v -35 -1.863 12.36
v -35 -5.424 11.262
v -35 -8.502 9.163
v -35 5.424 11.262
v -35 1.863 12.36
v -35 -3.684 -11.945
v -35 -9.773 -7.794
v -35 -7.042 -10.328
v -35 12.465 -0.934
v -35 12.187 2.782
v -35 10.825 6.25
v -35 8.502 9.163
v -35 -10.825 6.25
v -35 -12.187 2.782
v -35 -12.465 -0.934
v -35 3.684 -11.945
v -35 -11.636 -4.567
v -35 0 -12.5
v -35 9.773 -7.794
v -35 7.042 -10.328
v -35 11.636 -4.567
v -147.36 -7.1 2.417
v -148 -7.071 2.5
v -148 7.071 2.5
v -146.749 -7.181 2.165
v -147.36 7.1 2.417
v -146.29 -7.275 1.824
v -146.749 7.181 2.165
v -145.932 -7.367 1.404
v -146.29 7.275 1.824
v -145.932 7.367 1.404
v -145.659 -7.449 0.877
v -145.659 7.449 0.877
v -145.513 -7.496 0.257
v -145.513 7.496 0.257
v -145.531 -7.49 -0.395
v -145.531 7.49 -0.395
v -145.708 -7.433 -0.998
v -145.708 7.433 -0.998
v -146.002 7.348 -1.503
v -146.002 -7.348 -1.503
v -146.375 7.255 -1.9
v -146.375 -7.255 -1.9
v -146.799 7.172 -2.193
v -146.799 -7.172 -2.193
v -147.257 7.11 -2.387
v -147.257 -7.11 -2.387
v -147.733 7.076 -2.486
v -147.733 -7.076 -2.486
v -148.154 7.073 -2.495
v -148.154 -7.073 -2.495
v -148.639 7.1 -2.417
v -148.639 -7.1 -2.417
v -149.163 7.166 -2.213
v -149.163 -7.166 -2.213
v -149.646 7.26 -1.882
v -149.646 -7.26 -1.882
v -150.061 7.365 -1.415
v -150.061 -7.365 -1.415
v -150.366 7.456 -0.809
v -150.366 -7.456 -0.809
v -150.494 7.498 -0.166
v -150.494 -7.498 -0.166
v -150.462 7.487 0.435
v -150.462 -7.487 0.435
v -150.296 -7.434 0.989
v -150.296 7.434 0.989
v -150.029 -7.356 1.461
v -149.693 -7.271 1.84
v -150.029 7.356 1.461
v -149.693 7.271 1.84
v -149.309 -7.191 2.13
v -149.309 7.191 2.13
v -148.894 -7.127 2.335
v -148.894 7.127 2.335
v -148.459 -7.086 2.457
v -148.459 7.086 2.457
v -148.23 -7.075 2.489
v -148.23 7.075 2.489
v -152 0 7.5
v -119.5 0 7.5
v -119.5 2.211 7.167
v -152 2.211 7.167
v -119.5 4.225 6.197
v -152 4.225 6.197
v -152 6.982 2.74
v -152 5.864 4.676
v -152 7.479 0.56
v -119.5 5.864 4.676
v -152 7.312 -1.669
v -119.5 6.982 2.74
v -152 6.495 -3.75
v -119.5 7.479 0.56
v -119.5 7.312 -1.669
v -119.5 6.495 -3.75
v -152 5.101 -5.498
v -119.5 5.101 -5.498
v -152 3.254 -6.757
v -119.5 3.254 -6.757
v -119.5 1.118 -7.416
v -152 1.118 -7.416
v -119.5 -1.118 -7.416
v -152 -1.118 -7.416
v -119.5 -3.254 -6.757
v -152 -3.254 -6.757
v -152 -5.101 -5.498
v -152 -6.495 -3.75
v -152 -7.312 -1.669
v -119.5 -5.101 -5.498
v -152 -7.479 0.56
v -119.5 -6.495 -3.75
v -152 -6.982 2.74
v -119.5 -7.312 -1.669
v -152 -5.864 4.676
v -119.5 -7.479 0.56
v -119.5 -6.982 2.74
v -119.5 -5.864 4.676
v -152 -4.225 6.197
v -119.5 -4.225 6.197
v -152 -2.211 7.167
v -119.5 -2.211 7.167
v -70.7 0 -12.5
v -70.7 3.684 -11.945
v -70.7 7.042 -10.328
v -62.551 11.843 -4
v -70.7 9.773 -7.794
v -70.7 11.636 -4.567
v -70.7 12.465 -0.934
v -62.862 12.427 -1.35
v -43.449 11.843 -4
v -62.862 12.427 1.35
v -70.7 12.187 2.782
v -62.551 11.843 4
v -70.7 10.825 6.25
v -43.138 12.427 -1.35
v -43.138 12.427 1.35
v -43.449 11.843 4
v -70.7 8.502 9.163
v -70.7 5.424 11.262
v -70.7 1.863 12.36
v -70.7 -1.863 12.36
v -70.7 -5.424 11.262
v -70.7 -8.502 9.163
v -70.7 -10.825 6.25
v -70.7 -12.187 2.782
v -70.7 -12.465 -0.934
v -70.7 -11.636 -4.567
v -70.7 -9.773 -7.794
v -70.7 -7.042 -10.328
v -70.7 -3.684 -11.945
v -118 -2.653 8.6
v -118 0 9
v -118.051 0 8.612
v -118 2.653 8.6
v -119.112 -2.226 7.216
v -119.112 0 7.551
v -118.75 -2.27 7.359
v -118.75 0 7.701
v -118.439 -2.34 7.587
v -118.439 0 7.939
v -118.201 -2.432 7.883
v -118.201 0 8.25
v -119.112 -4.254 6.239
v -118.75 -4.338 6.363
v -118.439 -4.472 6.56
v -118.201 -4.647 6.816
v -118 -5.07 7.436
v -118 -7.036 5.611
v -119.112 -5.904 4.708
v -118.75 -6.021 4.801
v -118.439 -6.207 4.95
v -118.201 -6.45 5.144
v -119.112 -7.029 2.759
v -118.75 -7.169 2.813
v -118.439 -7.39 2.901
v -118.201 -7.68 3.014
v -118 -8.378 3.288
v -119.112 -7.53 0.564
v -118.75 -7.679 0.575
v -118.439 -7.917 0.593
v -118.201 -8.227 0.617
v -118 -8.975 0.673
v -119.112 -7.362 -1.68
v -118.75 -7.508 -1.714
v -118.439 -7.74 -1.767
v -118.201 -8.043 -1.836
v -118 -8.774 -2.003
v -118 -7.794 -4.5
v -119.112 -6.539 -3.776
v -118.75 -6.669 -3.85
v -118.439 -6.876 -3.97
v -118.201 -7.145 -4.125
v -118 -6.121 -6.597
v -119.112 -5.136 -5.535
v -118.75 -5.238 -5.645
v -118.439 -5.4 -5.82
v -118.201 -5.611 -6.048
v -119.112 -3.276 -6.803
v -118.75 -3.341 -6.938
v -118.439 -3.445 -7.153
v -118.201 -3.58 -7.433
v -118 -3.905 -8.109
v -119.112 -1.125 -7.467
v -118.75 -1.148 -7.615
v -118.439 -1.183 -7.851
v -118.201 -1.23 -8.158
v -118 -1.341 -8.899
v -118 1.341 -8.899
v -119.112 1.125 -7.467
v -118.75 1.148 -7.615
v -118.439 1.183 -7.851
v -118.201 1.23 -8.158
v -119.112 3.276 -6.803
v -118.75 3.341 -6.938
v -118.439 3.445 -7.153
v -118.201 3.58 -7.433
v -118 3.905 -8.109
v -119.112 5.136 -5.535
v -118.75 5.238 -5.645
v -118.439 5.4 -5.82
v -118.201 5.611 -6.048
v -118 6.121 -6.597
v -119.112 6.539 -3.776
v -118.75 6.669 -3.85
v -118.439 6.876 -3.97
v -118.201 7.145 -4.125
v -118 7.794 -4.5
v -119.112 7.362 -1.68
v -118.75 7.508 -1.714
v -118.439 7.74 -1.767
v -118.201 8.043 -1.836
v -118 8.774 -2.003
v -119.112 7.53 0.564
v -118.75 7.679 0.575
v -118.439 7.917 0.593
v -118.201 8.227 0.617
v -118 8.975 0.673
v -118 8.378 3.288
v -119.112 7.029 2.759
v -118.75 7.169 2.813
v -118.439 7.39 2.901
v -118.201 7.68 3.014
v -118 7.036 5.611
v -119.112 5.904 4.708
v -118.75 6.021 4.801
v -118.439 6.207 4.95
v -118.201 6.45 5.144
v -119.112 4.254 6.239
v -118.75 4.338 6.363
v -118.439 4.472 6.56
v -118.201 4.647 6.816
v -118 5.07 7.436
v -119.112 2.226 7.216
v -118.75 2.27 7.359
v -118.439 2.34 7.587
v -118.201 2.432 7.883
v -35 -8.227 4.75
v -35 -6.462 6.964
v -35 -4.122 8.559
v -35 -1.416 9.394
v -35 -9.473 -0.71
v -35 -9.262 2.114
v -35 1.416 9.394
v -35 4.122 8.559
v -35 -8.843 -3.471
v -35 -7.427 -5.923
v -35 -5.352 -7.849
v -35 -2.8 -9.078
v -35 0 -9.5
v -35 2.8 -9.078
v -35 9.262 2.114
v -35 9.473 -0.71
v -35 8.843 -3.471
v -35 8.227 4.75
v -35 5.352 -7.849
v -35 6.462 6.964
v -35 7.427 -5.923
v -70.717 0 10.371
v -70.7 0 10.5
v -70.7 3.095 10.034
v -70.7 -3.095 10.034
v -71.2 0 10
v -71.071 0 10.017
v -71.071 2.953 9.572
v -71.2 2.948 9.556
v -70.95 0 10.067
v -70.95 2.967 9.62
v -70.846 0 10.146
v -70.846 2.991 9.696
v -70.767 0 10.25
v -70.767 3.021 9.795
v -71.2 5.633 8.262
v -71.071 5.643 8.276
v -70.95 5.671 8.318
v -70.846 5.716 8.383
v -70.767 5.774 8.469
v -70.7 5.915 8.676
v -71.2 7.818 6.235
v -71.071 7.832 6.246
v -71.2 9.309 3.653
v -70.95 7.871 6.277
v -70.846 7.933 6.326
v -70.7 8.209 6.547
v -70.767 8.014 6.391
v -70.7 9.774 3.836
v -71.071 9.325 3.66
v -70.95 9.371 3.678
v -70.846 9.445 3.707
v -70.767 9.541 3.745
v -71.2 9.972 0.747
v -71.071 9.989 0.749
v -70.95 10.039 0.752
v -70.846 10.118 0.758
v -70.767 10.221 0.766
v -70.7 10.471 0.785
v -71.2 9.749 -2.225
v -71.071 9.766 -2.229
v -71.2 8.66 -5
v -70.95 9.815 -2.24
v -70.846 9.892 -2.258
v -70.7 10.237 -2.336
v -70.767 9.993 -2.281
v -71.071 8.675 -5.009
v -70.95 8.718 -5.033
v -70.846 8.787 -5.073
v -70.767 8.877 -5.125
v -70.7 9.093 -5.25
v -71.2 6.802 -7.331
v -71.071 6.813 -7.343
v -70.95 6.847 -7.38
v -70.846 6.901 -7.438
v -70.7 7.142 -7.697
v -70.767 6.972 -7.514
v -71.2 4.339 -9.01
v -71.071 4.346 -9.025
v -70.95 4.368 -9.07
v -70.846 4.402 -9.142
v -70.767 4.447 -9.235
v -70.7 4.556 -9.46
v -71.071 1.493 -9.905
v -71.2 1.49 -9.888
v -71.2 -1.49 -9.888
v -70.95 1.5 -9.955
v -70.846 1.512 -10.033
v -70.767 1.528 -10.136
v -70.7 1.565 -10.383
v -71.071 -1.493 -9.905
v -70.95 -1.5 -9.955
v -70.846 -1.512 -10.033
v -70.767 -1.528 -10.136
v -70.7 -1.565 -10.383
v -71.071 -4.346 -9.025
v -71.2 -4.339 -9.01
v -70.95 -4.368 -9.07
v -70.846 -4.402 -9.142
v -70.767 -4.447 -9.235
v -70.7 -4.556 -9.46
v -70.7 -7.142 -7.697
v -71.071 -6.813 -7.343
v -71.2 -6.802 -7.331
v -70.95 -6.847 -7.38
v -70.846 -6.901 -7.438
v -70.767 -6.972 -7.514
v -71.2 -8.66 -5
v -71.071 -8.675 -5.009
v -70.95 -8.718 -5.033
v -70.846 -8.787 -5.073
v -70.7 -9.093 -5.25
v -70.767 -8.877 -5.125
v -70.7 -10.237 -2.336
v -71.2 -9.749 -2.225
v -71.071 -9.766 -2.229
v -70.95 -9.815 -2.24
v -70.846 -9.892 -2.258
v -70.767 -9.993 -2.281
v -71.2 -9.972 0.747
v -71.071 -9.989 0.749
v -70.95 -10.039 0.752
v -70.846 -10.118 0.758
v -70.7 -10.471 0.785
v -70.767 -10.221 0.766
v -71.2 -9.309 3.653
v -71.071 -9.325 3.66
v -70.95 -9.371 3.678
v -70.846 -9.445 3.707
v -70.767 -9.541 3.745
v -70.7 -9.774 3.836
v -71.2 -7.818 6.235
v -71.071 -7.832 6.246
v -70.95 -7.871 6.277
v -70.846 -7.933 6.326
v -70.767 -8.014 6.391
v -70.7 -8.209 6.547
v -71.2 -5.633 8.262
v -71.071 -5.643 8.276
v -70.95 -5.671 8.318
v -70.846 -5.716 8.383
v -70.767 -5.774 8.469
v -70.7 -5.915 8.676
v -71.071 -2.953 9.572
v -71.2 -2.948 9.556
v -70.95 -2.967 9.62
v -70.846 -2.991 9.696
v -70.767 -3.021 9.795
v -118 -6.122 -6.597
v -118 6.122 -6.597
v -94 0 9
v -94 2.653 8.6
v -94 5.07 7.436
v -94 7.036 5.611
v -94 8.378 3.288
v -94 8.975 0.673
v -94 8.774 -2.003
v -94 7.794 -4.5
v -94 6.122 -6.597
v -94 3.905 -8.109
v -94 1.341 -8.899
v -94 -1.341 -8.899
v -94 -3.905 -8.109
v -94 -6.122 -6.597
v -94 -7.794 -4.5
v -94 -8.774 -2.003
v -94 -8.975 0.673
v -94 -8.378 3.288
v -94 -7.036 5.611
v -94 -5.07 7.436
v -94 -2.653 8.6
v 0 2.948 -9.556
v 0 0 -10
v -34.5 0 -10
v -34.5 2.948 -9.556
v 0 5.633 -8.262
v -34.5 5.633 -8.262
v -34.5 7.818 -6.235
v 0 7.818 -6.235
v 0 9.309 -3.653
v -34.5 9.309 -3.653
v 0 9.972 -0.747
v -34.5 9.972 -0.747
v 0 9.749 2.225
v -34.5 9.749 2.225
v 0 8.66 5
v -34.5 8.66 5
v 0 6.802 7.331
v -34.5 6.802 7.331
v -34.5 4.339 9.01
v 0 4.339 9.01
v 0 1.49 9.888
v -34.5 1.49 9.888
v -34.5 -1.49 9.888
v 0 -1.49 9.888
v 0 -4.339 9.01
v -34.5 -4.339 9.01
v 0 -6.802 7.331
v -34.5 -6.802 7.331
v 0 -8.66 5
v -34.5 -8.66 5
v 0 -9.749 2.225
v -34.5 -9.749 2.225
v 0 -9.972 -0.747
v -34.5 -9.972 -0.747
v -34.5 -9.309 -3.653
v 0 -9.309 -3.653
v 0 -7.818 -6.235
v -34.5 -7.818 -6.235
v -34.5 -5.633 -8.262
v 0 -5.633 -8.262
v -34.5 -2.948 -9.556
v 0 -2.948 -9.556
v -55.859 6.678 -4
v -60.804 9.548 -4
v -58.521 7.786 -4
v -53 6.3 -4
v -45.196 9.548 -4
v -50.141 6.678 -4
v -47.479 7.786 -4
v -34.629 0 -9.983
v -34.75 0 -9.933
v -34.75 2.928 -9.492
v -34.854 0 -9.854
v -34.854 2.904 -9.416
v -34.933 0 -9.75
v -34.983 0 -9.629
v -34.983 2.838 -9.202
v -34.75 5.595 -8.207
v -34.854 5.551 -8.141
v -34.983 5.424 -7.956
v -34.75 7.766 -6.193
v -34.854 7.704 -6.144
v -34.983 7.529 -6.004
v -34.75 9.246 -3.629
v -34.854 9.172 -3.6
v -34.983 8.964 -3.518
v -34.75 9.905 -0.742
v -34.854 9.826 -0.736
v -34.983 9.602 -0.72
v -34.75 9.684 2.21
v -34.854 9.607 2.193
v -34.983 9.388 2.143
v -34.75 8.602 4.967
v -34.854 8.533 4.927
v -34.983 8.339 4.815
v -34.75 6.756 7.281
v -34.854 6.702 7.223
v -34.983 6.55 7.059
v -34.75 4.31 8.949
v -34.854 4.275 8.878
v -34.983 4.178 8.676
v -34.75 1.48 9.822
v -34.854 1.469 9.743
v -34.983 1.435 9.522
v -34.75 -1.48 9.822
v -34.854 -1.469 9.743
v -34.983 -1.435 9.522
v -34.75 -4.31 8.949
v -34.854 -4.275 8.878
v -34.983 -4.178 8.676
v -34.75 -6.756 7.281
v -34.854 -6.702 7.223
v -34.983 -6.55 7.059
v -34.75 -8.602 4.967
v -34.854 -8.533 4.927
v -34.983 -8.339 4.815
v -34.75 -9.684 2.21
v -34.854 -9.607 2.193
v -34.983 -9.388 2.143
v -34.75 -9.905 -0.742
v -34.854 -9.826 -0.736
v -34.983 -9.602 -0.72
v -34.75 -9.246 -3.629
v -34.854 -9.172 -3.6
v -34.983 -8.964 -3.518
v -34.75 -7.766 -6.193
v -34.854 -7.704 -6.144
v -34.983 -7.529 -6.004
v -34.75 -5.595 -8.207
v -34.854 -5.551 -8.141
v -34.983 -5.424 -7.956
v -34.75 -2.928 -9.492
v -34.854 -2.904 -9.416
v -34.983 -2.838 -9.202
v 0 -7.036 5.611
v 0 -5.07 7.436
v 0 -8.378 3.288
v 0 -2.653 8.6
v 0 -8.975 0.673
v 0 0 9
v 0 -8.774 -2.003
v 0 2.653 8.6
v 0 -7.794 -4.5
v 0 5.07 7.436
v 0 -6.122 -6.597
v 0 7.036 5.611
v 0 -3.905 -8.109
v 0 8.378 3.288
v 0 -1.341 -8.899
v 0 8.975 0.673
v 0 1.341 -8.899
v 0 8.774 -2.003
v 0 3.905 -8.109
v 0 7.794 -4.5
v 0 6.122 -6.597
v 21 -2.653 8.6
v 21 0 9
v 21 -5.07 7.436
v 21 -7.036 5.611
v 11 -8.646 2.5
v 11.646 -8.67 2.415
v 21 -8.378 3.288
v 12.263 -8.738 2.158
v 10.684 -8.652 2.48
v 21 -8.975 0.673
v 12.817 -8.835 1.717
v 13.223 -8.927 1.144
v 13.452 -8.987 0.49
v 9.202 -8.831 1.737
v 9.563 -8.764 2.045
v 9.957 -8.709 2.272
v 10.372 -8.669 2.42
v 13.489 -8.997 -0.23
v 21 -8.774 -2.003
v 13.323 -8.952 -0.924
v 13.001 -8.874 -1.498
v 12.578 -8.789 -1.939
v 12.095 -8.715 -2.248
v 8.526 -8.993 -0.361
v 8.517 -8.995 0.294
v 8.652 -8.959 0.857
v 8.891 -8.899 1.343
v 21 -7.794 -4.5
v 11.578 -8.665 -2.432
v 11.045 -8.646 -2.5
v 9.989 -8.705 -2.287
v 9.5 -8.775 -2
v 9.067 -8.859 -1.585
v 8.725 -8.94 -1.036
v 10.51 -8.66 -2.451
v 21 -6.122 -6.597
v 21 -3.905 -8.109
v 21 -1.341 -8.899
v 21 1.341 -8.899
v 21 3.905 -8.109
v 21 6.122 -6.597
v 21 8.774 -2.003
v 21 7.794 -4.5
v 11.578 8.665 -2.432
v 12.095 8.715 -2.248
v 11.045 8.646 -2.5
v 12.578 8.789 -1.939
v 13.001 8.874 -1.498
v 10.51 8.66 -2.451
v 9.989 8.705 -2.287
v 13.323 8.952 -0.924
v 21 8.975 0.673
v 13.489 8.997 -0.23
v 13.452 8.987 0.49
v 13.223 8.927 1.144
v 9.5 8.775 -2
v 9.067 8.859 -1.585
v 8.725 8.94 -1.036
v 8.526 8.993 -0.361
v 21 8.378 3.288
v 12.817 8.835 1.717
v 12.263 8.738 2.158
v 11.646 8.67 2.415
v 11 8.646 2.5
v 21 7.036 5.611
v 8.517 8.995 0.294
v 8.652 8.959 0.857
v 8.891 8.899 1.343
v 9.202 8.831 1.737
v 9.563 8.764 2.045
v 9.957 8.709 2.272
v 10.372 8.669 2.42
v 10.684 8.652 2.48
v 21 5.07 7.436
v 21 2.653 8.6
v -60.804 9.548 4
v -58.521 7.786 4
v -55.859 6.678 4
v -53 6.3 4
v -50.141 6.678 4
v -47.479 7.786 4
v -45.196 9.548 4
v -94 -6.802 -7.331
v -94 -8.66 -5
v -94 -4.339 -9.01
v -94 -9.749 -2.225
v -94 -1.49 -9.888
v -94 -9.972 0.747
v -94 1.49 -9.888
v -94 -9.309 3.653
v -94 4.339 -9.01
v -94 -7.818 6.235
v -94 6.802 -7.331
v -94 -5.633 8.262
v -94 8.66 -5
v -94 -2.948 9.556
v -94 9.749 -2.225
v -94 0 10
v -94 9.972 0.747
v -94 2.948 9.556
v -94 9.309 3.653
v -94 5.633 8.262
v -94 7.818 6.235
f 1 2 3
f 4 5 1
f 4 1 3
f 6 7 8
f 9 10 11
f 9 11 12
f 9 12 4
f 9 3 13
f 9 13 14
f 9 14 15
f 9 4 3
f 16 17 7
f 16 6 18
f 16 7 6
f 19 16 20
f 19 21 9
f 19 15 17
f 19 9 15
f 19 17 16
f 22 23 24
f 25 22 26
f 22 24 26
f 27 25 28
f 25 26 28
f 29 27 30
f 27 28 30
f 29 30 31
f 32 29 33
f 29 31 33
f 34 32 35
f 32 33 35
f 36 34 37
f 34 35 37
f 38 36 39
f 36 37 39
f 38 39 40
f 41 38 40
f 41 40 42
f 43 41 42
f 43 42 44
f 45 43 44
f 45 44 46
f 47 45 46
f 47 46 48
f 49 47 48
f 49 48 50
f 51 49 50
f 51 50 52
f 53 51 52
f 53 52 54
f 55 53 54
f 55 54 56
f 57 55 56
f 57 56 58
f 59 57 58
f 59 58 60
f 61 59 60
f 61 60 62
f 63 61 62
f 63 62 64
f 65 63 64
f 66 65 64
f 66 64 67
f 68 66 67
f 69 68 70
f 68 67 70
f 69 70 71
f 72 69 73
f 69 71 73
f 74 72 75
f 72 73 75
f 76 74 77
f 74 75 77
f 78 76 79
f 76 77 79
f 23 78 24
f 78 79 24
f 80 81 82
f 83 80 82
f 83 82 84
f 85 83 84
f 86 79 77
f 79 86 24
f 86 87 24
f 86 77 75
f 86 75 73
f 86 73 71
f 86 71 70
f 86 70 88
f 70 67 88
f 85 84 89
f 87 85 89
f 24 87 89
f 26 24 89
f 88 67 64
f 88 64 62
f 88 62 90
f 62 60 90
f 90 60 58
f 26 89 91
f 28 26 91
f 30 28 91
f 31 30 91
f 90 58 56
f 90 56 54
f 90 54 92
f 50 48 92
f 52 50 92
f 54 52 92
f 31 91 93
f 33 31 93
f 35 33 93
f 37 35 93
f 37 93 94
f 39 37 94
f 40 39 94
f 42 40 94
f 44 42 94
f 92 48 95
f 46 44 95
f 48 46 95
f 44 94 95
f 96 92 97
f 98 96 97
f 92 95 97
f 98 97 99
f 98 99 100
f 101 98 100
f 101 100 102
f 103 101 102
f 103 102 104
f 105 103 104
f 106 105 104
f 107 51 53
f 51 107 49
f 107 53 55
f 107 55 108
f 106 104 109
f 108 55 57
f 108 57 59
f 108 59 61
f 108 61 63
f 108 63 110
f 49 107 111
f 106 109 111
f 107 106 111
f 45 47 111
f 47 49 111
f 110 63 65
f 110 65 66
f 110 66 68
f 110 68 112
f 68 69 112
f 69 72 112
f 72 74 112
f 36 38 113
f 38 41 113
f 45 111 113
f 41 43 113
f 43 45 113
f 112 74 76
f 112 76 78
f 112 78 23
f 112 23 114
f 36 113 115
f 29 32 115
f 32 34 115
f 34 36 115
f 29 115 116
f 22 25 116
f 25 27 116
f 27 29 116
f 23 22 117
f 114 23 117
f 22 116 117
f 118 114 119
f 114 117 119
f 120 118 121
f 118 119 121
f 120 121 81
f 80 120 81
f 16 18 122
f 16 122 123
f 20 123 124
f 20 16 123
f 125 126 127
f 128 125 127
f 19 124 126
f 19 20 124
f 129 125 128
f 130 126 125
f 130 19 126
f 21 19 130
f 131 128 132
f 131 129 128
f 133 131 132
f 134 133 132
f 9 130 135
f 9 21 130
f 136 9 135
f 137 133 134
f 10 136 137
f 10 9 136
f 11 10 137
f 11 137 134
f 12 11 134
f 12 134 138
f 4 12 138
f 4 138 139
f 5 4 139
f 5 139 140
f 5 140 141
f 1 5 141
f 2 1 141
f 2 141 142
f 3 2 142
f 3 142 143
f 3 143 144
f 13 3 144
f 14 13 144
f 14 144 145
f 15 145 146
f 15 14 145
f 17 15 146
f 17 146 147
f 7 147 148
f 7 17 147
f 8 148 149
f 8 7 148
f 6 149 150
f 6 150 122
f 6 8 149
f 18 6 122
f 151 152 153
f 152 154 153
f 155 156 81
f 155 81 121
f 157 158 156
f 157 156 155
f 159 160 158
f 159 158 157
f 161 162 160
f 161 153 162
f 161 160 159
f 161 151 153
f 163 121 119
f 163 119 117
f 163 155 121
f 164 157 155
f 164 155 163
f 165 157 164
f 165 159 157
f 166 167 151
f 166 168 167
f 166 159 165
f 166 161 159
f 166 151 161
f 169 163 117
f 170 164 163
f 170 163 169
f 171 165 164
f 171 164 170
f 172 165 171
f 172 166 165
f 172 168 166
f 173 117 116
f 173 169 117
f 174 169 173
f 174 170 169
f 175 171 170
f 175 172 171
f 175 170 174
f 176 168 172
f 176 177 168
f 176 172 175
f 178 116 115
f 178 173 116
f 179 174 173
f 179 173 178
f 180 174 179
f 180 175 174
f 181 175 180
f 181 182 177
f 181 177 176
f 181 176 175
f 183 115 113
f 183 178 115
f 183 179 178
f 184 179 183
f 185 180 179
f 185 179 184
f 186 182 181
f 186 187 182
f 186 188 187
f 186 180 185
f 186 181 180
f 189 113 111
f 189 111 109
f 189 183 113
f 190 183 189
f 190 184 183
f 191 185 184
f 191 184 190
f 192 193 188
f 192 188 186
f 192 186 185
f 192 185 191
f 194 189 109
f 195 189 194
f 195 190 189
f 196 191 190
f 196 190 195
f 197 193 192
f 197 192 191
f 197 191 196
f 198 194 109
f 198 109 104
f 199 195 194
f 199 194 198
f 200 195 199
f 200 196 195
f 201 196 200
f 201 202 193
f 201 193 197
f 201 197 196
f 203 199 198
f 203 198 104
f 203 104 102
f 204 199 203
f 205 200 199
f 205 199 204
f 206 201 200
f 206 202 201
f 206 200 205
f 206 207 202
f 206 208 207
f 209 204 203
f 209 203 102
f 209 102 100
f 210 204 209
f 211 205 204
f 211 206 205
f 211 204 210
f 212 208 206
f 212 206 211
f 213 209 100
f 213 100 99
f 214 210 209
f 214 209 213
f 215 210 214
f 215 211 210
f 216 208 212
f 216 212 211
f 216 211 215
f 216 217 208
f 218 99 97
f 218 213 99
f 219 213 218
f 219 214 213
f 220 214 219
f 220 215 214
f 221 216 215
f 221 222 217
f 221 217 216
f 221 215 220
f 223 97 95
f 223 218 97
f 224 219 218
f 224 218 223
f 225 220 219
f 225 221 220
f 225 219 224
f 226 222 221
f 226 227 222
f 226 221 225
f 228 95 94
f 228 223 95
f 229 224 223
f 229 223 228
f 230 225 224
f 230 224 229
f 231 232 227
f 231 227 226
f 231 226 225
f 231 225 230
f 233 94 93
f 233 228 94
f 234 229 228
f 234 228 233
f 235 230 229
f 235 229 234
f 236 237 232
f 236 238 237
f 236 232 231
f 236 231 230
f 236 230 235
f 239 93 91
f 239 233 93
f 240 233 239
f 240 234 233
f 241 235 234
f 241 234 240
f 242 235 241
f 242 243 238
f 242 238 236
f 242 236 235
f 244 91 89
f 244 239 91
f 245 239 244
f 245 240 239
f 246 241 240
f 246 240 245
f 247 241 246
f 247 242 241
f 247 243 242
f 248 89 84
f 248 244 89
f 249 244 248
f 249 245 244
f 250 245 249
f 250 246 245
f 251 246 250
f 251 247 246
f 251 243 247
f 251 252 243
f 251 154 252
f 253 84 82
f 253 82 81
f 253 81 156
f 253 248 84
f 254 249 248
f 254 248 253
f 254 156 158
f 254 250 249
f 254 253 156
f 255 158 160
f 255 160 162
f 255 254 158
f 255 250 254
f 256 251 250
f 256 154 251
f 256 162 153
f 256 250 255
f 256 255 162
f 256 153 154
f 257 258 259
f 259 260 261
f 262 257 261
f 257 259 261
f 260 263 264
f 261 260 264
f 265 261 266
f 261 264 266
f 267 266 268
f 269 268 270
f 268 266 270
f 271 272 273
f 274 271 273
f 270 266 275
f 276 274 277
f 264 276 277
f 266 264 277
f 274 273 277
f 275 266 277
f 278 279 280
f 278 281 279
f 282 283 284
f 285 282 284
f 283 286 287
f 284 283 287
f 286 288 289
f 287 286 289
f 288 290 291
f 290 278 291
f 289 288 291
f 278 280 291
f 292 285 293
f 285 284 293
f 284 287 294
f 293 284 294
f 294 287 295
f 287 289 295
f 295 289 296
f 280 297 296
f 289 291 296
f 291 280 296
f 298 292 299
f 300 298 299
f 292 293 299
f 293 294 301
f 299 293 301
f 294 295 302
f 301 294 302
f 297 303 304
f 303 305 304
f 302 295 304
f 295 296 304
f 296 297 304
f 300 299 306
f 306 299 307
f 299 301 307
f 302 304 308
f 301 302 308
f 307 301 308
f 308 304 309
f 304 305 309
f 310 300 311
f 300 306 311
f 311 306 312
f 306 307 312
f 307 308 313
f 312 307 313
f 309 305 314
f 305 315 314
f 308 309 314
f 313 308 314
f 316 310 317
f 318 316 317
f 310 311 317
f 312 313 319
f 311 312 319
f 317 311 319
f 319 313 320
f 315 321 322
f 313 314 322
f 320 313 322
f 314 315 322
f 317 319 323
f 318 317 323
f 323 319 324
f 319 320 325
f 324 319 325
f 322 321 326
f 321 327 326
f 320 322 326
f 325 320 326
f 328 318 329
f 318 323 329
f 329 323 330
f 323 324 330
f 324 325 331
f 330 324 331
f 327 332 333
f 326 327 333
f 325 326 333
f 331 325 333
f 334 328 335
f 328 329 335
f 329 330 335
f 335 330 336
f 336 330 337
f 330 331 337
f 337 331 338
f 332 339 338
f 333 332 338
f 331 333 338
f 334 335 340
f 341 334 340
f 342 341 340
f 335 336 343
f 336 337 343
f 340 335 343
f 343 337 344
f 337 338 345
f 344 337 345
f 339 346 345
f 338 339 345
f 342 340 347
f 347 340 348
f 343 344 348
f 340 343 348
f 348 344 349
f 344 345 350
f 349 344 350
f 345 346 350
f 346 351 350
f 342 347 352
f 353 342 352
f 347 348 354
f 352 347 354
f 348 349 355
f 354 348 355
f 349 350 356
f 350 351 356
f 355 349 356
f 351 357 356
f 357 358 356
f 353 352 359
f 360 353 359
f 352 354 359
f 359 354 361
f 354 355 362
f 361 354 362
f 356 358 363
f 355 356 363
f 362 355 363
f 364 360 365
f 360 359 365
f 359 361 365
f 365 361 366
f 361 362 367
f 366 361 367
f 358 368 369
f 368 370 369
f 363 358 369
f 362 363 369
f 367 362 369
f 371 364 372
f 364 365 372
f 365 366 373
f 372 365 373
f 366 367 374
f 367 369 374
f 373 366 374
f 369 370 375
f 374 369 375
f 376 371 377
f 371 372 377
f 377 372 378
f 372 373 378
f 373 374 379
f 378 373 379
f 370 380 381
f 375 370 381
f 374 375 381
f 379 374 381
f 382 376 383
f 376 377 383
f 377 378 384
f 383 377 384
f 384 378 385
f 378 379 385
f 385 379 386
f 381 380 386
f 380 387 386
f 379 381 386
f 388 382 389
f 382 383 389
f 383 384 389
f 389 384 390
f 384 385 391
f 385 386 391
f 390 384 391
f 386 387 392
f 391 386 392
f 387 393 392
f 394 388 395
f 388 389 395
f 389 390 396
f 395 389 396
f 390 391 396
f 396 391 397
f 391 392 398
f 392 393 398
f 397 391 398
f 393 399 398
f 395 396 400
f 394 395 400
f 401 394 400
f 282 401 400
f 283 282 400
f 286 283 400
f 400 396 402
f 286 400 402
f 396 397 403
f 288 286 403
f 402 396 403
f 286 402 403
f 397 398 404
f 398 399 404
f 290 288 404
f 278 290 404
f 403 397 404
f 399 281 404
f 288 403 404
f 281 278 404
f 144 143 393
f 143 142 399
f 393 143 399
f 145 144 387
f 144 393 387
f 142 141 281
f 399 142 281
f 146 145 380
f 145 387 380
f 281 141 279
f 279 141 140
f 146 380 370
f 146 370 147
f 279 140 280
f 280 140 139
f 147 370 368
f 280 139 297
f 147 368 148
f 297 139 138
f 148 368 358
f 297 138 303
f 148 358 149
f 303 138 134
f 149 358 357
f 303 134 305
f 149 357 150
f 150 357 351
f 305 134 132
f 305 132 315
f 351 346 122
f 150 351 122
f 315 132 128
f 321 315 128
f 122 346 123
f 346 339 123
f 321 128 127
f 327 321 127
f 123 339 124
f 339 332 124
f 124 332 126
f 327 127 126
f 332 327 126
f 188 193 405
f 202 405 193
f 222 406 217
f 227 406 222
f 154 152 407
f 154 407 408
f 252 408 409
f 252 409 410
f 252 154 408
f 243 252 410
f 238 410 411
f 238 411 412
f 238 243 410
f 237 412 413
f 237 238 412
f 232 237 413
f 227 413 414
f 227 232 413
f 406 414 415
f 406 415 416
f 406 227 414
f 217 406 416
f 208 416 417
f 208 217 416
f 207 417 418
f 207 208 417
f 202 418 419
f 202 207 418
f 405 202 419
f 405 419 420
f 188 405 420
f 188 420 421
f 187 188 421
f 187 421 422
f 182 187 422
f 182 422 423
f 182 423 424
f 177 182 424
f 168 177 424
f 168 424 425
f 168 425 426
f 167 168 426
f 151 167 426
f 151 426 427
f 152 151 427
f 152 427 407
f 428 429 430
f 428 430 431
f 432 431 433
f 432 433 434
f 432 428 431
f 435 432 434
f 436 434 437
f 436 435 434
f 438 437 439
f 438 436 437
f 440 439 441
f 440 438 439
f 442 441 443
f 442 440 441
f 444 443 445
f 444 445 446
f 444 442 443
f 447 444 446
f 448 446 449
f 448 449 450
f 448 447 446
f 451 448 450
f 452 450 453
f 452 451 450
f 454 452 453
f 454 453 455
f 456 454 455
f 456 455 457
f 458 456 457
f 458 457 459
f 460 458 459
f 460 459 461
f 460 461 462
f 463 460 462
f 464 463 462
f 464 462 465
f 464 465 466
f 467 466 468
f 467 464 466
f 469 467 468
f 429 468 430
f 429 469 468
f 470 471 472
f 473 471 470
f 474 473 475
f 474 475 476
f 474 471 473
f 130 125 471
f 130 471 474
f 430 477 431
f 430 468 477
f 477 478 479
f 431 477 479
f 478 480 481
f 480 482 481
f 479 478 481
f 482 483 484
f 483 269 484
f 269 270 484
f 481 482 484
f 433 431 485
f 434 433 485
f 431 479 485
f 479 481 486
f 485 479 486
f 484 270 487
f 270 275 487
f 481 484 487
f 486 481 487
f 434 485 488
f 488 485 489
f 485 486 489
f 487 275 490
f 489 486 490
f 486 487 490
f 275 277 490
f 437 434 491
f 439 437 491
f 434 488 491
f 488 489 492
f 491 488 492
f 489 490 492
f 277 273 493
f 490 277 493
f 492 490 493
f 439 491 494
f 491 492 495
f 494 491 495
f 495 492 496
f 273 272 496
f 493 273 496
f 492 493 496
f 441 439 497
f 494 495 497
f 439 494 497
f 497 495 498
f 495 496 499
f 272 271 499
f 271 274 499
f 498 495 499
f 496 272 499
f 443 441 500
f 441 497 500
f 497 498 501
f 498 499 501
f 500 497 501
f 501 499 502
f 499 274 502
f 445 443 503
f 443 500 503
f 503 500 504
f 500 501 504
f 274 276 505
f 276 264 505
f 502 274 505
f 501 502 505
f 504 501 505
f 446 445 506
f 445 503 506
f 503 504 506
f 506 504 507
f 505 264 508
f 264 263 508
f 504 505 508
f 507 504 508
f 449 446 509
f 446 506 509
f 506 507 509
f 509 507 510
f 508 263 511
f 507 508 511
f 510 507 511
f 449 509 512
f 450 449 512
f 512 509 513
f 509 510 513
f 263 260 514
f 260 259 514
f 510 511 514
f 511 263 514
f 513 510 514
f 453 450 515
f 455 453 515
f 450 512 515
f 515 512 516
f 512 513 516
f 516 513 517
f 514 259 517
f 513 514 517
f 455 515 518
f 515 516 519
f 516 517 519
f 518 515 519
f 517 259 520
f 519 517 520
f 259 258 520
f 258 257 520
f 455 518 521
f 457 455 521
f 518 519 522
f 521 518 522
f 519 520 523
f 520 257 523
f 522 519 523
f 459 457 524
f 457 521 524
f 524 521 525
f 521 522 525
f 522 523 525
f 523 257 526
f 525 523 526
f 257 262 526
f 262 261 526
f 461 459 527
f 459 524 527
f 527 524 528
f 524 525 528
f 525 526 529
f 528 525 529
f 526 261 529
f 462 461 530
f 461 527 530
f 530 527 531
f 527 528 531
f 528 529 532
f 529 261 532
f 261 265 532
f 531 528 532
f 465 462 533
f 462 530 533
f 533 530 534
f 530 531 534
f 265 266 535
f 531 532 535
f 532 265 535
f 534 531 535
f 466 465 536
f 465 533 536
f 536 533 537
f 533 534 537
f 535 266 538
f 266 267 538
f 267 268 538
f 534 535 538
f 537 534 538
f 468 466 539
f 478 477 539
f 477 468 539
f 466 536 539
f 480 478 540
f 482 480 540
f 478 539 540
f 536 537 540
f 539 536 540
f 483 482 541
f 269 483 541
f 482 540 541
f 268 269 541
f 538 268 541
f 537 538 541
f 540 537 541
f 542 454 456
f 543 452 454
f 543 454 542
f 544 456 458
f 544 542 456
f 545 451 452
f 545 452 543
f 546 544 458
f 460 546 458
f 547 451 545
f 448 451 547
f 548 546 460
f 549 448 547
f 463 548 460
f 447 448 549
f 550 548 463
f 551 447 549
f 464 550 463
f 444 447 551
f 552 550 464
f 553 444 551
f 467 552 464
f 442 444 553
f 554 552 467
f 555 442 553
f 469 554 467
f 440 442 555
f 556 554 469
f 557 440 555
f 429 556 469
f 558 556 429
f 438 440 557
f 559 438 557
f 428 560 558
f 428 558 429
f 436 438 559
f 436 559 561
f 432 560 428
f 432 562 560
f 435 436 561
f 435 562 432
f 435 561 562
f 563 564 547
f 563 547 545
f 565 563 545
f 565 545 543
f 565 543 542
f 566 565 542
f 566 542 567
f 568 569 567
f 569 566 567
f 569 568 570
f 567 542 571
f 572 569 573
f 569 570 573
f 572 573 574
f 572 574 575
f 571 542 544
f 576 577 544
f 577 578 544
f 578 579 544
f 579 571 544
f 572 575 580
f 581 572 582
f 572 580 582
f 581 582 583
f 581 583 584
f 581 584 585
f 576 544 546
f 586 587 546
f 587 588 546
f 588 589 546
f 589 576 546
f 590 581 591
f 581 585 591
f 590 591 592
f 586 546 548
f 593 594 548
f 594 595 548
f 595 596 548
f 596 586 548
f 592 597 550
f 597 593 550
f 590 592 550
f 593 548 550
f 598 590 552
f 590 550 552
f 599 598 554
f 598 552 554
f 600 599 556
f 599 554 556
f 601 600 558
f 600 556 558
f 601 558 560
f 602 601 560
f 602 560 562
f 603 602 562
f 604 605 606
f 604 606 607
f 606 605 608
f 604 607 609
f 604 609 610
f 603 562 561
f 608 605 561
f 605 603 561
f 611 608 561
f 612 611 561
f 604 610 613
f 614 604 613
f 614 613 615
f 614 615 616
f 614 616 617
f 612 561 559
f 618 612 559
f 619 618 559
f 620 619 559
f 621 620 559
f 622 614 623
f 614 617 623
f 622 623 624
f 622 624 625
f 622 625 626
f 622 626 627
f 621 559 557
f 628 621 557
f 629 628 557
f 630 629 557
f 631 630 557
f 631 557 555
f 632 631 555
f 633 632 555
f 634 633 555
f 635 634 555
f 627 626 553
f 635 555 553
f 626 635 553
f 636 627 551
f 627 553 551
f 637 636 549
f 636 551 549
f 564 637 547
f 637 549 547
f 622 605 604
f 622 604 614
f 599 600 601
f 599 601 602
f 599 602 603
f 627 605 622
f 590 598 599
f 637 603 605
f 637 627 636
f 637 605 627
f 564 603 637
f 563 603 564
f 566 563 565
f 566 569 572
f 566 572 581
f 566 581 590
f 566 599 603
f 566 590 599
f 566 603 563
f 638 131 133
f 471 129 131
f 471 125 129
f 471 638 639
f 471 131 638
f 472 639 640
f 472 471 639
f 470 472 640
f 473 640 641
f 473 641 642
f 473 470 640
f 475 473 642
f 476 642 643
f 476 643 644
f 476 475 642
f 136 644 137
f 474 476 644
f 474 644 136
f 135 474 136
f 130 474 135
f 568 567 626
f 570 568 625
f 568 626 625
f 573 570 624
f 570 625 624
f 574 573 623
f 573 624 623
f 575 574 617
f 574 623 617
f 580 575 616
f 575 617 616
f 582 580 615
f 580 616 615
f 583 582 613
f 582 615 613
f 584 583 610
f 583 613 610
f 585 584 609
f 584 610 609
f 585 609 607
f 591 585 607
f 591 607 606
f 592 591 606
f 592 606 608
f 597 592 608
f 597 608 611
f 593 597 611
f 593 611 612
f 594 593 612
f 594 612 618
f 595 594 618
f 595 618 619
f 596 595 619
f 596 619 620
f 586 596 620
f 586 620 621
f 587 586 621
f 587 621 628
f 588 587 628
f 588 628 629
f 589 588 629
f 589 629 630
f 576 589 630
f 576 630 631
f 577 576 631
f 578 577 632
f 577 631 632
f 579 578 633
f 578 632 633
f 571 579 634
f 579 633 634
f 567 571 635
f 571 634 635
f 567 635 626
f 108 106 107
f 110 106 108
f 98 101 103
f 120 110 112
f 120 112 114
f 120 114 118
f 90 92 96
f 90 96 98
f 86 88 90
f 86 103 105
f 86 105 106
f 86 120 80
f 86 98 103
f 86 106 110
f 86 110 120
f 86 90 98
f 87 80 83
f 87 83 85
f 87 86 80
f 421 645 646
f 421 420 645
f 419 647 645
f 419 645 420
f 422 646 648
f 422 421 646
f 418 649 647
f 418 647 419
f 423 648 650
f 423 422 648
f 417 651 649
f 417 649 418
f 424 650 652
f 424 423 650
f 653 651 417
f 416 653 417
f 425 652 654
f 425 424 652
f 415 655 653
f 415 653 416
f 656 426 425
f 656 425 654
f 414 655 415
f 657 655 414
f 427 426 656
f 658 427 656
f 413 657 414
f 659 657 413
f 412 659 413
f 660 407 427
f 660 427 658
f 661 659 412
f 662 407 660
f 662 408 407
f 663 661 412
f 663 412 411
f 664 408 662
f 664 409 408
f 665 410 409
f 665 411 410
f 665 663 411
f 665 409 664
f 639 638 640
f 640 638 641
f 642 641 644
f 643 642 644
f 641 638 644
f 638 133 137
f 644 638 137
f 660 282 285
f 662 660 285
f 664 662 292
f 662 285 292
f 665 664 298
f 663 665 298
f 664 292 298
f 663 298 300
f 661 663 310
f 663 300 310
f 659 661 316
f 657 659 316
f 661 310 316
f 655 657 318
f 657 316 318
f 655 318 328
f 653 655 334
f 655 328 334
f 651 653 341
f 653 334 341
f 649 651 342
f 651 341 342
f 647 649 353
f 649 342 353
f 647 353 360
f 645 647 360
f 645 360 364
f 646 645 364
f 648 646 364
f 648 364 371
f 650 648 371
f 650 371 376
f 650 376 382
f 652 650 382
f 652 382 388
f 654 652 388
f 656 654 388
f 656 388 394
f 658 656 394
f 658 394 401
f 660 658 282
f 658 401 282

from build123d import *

# Parameters (mm, degrees)
SKETCH_2_R               = 9
EXTRUDE_1_DEPTH          = 21
SKETCH_2_3_R             = 10
EXTRUDE_2_DEPTH          = 35
EXTRUDE_START            = -35
SKETCH_2_4_R             = 12.5
EXTRUDE_3_DEPTH          = 35.7
SKETCH_3_R               = 10
EXTRUDE_4_DEPTH          = 23.3
EXTRUDE_START_2          = 47.3
SKETCH_3_3_R             = 9
EXTRUDE_5_DEPTH          = 34
EXTRUDE_6_DEPTH          = 34
EXTRUDE_6_DEPTH_BACK     = 16
EXTRUDE_6_START          = 47.3
SKETCH_3_4_R             = 7.5
FILLET_1_R               = 1.5
FILLET_2_R               = 0.5
FILLET_3_R               = 0.5
SKETCH_4_R               = 2.5
CUT_EXTRUDE_1_DEPTH      = 34
CUT_EXTRUDE_2_DEPTH      = 4
CUT_EXTRUDE_2_DEPTH_BACK = 4
SKETCH_5_R               = 11


with BuildPart() as part:
    # 스케치2 → 보스-돌출1 (new body)
    with BuildSketch(Plane(origin=(0, 0, 0), x_dir=(0, 0, -1), z_dir=(1, 0, 0))):
        with Locations(Location((0, 0, 0), (0, 0, 180))):
            Circle(SKETCH_2_R)
    extrude(amount=EXTRUDE_1_DEPTH)

    # 스케치2<3> → 보스-돌출2 (add)
    with BuildSketch(Plane(origin=(0, 0, 0), x_dir=(0, 0, -1), z_dir=(1, 0, 0))):
        Circle(SKETCH_2_3_R)
    extrude(amount=-EXTRUDE_2_DEPTH)

    # 필렛3
    fillet_3_edges = [part.edges().sort_by_distance(p)[0] for p in [
        (-35, 0, 10),
    ]]
    fillet(fillet_3_edges, radius=FILLET_3_R)


with BuildPart() as body_2:
    # 스케치2<4> → 보스-돌출3 (new body)
    with BuildSketch(Plane(origin=(0, 0, 0), x_dir=(0, 0, -1), z_dir=(1, 0, 0)).offset(EXTRUDE_START)):
        Circle(SKETCH_2_4_R)
    extrude(amount=-EXTRUDE_3_DEPTH)

    # 스케치3 → 보스-돌출4 (add)
    with BuildSketch(Plane.ZY.offset(70.7)):
        Circle(SKETCH_3_R)
    extrude(amount=EXTRUDE_4_DEPTH)

    # 스케치3<3> → 보스-돌출5 (add)
    with BuildSketch(Plane.ZY.offset(70.7).offset(EXTRUDE_START_2)):
        Circle(SKETCH_3_3_R)
    extrude(amount=-EXTRUDE_5_DEPTH)

    # 스케치3<4> → 보스-돌출6 (add, two sides: drawn at the far end of the back side and taken through both)
    with BuildSketch(Plane.ZY.offset(70.7).offset(EXTRUDE_6_START - EXTRUDE_6_DEPTH_BACK)):
        Circle(SKETCH_3_4_R)
    extrude(amount=EXTRUDE_6_DEPTH + EXTRUDE_6_DEPTH_BACK)

    # 필렛1
    fillet_1_edges = [body_2.edges().sort_by_distance(p)[0] for p in [
        (-118, 0, -7.5),
    ]]
    fillet(fillet_1_edges, radius=FILLET_1_R - 0.0001)  # a hair under: the kernel refuses the full size

    # 필렛2
    fillet_2_edges = [body_2.edges().sort_by_distance(p)[0] for p in [
        (-70.7, 0, -10),
    ]]
    fillet(fillet_2_edges, radius=FILLET_2_R)


with BuildPart() as cut_extrude_1_tool:
    # 스케치4 → 컷-돌출1 (new body)
    with BuildSketch(Plane(origin=(0, 14, 0), x_dir=(1, 0, 0), z_dir=(0, 1, 0))):
        with Locations(Location((-148, 0, 0), (0, 0, 270))):
            Circle(SKETCH_4_R)
        with Locations(Location((11, 0, 0), (0, 0, 270))):
            Circle(SKETCH_4_R)
    extrude(amount=-CUT_EXTRUDE_1_DEPTH)


with BuildPart() as part_1:
    add(part.part)

    # 컷-돌출1: cut by cut_extrude_1_tool
    add(cut_extrude_1_tool.part, mode=Mode.SUBTRACT)


with BuildPart() as body_2_1:
    add(body_2.part)

    # 컷-돌출1: cut by cut_extrude_1_tool
    add(cut_extrude_1_tool.part, mode=Mode.SUBTRACT)

    # 스케치5 → 컷-돌출2 (cut, two sides: drawn at the far end of the back side and taken through both)
    with BuildSketch(Plane.XY.offset(-CUT_EXTRUDE_2_DEPTH_BACK)):
        with Locations((-53, 17.3)):
            Circle(SKETCH_5_R)
    extrude(amount=CUT_EXTRUDE_2_DEPTH + CUT_EXTRUDE_2_DEPTH_BACK, mode=Mode.SUBTRACT)


solid = Compound([part_1.part, body_2_1.part])
